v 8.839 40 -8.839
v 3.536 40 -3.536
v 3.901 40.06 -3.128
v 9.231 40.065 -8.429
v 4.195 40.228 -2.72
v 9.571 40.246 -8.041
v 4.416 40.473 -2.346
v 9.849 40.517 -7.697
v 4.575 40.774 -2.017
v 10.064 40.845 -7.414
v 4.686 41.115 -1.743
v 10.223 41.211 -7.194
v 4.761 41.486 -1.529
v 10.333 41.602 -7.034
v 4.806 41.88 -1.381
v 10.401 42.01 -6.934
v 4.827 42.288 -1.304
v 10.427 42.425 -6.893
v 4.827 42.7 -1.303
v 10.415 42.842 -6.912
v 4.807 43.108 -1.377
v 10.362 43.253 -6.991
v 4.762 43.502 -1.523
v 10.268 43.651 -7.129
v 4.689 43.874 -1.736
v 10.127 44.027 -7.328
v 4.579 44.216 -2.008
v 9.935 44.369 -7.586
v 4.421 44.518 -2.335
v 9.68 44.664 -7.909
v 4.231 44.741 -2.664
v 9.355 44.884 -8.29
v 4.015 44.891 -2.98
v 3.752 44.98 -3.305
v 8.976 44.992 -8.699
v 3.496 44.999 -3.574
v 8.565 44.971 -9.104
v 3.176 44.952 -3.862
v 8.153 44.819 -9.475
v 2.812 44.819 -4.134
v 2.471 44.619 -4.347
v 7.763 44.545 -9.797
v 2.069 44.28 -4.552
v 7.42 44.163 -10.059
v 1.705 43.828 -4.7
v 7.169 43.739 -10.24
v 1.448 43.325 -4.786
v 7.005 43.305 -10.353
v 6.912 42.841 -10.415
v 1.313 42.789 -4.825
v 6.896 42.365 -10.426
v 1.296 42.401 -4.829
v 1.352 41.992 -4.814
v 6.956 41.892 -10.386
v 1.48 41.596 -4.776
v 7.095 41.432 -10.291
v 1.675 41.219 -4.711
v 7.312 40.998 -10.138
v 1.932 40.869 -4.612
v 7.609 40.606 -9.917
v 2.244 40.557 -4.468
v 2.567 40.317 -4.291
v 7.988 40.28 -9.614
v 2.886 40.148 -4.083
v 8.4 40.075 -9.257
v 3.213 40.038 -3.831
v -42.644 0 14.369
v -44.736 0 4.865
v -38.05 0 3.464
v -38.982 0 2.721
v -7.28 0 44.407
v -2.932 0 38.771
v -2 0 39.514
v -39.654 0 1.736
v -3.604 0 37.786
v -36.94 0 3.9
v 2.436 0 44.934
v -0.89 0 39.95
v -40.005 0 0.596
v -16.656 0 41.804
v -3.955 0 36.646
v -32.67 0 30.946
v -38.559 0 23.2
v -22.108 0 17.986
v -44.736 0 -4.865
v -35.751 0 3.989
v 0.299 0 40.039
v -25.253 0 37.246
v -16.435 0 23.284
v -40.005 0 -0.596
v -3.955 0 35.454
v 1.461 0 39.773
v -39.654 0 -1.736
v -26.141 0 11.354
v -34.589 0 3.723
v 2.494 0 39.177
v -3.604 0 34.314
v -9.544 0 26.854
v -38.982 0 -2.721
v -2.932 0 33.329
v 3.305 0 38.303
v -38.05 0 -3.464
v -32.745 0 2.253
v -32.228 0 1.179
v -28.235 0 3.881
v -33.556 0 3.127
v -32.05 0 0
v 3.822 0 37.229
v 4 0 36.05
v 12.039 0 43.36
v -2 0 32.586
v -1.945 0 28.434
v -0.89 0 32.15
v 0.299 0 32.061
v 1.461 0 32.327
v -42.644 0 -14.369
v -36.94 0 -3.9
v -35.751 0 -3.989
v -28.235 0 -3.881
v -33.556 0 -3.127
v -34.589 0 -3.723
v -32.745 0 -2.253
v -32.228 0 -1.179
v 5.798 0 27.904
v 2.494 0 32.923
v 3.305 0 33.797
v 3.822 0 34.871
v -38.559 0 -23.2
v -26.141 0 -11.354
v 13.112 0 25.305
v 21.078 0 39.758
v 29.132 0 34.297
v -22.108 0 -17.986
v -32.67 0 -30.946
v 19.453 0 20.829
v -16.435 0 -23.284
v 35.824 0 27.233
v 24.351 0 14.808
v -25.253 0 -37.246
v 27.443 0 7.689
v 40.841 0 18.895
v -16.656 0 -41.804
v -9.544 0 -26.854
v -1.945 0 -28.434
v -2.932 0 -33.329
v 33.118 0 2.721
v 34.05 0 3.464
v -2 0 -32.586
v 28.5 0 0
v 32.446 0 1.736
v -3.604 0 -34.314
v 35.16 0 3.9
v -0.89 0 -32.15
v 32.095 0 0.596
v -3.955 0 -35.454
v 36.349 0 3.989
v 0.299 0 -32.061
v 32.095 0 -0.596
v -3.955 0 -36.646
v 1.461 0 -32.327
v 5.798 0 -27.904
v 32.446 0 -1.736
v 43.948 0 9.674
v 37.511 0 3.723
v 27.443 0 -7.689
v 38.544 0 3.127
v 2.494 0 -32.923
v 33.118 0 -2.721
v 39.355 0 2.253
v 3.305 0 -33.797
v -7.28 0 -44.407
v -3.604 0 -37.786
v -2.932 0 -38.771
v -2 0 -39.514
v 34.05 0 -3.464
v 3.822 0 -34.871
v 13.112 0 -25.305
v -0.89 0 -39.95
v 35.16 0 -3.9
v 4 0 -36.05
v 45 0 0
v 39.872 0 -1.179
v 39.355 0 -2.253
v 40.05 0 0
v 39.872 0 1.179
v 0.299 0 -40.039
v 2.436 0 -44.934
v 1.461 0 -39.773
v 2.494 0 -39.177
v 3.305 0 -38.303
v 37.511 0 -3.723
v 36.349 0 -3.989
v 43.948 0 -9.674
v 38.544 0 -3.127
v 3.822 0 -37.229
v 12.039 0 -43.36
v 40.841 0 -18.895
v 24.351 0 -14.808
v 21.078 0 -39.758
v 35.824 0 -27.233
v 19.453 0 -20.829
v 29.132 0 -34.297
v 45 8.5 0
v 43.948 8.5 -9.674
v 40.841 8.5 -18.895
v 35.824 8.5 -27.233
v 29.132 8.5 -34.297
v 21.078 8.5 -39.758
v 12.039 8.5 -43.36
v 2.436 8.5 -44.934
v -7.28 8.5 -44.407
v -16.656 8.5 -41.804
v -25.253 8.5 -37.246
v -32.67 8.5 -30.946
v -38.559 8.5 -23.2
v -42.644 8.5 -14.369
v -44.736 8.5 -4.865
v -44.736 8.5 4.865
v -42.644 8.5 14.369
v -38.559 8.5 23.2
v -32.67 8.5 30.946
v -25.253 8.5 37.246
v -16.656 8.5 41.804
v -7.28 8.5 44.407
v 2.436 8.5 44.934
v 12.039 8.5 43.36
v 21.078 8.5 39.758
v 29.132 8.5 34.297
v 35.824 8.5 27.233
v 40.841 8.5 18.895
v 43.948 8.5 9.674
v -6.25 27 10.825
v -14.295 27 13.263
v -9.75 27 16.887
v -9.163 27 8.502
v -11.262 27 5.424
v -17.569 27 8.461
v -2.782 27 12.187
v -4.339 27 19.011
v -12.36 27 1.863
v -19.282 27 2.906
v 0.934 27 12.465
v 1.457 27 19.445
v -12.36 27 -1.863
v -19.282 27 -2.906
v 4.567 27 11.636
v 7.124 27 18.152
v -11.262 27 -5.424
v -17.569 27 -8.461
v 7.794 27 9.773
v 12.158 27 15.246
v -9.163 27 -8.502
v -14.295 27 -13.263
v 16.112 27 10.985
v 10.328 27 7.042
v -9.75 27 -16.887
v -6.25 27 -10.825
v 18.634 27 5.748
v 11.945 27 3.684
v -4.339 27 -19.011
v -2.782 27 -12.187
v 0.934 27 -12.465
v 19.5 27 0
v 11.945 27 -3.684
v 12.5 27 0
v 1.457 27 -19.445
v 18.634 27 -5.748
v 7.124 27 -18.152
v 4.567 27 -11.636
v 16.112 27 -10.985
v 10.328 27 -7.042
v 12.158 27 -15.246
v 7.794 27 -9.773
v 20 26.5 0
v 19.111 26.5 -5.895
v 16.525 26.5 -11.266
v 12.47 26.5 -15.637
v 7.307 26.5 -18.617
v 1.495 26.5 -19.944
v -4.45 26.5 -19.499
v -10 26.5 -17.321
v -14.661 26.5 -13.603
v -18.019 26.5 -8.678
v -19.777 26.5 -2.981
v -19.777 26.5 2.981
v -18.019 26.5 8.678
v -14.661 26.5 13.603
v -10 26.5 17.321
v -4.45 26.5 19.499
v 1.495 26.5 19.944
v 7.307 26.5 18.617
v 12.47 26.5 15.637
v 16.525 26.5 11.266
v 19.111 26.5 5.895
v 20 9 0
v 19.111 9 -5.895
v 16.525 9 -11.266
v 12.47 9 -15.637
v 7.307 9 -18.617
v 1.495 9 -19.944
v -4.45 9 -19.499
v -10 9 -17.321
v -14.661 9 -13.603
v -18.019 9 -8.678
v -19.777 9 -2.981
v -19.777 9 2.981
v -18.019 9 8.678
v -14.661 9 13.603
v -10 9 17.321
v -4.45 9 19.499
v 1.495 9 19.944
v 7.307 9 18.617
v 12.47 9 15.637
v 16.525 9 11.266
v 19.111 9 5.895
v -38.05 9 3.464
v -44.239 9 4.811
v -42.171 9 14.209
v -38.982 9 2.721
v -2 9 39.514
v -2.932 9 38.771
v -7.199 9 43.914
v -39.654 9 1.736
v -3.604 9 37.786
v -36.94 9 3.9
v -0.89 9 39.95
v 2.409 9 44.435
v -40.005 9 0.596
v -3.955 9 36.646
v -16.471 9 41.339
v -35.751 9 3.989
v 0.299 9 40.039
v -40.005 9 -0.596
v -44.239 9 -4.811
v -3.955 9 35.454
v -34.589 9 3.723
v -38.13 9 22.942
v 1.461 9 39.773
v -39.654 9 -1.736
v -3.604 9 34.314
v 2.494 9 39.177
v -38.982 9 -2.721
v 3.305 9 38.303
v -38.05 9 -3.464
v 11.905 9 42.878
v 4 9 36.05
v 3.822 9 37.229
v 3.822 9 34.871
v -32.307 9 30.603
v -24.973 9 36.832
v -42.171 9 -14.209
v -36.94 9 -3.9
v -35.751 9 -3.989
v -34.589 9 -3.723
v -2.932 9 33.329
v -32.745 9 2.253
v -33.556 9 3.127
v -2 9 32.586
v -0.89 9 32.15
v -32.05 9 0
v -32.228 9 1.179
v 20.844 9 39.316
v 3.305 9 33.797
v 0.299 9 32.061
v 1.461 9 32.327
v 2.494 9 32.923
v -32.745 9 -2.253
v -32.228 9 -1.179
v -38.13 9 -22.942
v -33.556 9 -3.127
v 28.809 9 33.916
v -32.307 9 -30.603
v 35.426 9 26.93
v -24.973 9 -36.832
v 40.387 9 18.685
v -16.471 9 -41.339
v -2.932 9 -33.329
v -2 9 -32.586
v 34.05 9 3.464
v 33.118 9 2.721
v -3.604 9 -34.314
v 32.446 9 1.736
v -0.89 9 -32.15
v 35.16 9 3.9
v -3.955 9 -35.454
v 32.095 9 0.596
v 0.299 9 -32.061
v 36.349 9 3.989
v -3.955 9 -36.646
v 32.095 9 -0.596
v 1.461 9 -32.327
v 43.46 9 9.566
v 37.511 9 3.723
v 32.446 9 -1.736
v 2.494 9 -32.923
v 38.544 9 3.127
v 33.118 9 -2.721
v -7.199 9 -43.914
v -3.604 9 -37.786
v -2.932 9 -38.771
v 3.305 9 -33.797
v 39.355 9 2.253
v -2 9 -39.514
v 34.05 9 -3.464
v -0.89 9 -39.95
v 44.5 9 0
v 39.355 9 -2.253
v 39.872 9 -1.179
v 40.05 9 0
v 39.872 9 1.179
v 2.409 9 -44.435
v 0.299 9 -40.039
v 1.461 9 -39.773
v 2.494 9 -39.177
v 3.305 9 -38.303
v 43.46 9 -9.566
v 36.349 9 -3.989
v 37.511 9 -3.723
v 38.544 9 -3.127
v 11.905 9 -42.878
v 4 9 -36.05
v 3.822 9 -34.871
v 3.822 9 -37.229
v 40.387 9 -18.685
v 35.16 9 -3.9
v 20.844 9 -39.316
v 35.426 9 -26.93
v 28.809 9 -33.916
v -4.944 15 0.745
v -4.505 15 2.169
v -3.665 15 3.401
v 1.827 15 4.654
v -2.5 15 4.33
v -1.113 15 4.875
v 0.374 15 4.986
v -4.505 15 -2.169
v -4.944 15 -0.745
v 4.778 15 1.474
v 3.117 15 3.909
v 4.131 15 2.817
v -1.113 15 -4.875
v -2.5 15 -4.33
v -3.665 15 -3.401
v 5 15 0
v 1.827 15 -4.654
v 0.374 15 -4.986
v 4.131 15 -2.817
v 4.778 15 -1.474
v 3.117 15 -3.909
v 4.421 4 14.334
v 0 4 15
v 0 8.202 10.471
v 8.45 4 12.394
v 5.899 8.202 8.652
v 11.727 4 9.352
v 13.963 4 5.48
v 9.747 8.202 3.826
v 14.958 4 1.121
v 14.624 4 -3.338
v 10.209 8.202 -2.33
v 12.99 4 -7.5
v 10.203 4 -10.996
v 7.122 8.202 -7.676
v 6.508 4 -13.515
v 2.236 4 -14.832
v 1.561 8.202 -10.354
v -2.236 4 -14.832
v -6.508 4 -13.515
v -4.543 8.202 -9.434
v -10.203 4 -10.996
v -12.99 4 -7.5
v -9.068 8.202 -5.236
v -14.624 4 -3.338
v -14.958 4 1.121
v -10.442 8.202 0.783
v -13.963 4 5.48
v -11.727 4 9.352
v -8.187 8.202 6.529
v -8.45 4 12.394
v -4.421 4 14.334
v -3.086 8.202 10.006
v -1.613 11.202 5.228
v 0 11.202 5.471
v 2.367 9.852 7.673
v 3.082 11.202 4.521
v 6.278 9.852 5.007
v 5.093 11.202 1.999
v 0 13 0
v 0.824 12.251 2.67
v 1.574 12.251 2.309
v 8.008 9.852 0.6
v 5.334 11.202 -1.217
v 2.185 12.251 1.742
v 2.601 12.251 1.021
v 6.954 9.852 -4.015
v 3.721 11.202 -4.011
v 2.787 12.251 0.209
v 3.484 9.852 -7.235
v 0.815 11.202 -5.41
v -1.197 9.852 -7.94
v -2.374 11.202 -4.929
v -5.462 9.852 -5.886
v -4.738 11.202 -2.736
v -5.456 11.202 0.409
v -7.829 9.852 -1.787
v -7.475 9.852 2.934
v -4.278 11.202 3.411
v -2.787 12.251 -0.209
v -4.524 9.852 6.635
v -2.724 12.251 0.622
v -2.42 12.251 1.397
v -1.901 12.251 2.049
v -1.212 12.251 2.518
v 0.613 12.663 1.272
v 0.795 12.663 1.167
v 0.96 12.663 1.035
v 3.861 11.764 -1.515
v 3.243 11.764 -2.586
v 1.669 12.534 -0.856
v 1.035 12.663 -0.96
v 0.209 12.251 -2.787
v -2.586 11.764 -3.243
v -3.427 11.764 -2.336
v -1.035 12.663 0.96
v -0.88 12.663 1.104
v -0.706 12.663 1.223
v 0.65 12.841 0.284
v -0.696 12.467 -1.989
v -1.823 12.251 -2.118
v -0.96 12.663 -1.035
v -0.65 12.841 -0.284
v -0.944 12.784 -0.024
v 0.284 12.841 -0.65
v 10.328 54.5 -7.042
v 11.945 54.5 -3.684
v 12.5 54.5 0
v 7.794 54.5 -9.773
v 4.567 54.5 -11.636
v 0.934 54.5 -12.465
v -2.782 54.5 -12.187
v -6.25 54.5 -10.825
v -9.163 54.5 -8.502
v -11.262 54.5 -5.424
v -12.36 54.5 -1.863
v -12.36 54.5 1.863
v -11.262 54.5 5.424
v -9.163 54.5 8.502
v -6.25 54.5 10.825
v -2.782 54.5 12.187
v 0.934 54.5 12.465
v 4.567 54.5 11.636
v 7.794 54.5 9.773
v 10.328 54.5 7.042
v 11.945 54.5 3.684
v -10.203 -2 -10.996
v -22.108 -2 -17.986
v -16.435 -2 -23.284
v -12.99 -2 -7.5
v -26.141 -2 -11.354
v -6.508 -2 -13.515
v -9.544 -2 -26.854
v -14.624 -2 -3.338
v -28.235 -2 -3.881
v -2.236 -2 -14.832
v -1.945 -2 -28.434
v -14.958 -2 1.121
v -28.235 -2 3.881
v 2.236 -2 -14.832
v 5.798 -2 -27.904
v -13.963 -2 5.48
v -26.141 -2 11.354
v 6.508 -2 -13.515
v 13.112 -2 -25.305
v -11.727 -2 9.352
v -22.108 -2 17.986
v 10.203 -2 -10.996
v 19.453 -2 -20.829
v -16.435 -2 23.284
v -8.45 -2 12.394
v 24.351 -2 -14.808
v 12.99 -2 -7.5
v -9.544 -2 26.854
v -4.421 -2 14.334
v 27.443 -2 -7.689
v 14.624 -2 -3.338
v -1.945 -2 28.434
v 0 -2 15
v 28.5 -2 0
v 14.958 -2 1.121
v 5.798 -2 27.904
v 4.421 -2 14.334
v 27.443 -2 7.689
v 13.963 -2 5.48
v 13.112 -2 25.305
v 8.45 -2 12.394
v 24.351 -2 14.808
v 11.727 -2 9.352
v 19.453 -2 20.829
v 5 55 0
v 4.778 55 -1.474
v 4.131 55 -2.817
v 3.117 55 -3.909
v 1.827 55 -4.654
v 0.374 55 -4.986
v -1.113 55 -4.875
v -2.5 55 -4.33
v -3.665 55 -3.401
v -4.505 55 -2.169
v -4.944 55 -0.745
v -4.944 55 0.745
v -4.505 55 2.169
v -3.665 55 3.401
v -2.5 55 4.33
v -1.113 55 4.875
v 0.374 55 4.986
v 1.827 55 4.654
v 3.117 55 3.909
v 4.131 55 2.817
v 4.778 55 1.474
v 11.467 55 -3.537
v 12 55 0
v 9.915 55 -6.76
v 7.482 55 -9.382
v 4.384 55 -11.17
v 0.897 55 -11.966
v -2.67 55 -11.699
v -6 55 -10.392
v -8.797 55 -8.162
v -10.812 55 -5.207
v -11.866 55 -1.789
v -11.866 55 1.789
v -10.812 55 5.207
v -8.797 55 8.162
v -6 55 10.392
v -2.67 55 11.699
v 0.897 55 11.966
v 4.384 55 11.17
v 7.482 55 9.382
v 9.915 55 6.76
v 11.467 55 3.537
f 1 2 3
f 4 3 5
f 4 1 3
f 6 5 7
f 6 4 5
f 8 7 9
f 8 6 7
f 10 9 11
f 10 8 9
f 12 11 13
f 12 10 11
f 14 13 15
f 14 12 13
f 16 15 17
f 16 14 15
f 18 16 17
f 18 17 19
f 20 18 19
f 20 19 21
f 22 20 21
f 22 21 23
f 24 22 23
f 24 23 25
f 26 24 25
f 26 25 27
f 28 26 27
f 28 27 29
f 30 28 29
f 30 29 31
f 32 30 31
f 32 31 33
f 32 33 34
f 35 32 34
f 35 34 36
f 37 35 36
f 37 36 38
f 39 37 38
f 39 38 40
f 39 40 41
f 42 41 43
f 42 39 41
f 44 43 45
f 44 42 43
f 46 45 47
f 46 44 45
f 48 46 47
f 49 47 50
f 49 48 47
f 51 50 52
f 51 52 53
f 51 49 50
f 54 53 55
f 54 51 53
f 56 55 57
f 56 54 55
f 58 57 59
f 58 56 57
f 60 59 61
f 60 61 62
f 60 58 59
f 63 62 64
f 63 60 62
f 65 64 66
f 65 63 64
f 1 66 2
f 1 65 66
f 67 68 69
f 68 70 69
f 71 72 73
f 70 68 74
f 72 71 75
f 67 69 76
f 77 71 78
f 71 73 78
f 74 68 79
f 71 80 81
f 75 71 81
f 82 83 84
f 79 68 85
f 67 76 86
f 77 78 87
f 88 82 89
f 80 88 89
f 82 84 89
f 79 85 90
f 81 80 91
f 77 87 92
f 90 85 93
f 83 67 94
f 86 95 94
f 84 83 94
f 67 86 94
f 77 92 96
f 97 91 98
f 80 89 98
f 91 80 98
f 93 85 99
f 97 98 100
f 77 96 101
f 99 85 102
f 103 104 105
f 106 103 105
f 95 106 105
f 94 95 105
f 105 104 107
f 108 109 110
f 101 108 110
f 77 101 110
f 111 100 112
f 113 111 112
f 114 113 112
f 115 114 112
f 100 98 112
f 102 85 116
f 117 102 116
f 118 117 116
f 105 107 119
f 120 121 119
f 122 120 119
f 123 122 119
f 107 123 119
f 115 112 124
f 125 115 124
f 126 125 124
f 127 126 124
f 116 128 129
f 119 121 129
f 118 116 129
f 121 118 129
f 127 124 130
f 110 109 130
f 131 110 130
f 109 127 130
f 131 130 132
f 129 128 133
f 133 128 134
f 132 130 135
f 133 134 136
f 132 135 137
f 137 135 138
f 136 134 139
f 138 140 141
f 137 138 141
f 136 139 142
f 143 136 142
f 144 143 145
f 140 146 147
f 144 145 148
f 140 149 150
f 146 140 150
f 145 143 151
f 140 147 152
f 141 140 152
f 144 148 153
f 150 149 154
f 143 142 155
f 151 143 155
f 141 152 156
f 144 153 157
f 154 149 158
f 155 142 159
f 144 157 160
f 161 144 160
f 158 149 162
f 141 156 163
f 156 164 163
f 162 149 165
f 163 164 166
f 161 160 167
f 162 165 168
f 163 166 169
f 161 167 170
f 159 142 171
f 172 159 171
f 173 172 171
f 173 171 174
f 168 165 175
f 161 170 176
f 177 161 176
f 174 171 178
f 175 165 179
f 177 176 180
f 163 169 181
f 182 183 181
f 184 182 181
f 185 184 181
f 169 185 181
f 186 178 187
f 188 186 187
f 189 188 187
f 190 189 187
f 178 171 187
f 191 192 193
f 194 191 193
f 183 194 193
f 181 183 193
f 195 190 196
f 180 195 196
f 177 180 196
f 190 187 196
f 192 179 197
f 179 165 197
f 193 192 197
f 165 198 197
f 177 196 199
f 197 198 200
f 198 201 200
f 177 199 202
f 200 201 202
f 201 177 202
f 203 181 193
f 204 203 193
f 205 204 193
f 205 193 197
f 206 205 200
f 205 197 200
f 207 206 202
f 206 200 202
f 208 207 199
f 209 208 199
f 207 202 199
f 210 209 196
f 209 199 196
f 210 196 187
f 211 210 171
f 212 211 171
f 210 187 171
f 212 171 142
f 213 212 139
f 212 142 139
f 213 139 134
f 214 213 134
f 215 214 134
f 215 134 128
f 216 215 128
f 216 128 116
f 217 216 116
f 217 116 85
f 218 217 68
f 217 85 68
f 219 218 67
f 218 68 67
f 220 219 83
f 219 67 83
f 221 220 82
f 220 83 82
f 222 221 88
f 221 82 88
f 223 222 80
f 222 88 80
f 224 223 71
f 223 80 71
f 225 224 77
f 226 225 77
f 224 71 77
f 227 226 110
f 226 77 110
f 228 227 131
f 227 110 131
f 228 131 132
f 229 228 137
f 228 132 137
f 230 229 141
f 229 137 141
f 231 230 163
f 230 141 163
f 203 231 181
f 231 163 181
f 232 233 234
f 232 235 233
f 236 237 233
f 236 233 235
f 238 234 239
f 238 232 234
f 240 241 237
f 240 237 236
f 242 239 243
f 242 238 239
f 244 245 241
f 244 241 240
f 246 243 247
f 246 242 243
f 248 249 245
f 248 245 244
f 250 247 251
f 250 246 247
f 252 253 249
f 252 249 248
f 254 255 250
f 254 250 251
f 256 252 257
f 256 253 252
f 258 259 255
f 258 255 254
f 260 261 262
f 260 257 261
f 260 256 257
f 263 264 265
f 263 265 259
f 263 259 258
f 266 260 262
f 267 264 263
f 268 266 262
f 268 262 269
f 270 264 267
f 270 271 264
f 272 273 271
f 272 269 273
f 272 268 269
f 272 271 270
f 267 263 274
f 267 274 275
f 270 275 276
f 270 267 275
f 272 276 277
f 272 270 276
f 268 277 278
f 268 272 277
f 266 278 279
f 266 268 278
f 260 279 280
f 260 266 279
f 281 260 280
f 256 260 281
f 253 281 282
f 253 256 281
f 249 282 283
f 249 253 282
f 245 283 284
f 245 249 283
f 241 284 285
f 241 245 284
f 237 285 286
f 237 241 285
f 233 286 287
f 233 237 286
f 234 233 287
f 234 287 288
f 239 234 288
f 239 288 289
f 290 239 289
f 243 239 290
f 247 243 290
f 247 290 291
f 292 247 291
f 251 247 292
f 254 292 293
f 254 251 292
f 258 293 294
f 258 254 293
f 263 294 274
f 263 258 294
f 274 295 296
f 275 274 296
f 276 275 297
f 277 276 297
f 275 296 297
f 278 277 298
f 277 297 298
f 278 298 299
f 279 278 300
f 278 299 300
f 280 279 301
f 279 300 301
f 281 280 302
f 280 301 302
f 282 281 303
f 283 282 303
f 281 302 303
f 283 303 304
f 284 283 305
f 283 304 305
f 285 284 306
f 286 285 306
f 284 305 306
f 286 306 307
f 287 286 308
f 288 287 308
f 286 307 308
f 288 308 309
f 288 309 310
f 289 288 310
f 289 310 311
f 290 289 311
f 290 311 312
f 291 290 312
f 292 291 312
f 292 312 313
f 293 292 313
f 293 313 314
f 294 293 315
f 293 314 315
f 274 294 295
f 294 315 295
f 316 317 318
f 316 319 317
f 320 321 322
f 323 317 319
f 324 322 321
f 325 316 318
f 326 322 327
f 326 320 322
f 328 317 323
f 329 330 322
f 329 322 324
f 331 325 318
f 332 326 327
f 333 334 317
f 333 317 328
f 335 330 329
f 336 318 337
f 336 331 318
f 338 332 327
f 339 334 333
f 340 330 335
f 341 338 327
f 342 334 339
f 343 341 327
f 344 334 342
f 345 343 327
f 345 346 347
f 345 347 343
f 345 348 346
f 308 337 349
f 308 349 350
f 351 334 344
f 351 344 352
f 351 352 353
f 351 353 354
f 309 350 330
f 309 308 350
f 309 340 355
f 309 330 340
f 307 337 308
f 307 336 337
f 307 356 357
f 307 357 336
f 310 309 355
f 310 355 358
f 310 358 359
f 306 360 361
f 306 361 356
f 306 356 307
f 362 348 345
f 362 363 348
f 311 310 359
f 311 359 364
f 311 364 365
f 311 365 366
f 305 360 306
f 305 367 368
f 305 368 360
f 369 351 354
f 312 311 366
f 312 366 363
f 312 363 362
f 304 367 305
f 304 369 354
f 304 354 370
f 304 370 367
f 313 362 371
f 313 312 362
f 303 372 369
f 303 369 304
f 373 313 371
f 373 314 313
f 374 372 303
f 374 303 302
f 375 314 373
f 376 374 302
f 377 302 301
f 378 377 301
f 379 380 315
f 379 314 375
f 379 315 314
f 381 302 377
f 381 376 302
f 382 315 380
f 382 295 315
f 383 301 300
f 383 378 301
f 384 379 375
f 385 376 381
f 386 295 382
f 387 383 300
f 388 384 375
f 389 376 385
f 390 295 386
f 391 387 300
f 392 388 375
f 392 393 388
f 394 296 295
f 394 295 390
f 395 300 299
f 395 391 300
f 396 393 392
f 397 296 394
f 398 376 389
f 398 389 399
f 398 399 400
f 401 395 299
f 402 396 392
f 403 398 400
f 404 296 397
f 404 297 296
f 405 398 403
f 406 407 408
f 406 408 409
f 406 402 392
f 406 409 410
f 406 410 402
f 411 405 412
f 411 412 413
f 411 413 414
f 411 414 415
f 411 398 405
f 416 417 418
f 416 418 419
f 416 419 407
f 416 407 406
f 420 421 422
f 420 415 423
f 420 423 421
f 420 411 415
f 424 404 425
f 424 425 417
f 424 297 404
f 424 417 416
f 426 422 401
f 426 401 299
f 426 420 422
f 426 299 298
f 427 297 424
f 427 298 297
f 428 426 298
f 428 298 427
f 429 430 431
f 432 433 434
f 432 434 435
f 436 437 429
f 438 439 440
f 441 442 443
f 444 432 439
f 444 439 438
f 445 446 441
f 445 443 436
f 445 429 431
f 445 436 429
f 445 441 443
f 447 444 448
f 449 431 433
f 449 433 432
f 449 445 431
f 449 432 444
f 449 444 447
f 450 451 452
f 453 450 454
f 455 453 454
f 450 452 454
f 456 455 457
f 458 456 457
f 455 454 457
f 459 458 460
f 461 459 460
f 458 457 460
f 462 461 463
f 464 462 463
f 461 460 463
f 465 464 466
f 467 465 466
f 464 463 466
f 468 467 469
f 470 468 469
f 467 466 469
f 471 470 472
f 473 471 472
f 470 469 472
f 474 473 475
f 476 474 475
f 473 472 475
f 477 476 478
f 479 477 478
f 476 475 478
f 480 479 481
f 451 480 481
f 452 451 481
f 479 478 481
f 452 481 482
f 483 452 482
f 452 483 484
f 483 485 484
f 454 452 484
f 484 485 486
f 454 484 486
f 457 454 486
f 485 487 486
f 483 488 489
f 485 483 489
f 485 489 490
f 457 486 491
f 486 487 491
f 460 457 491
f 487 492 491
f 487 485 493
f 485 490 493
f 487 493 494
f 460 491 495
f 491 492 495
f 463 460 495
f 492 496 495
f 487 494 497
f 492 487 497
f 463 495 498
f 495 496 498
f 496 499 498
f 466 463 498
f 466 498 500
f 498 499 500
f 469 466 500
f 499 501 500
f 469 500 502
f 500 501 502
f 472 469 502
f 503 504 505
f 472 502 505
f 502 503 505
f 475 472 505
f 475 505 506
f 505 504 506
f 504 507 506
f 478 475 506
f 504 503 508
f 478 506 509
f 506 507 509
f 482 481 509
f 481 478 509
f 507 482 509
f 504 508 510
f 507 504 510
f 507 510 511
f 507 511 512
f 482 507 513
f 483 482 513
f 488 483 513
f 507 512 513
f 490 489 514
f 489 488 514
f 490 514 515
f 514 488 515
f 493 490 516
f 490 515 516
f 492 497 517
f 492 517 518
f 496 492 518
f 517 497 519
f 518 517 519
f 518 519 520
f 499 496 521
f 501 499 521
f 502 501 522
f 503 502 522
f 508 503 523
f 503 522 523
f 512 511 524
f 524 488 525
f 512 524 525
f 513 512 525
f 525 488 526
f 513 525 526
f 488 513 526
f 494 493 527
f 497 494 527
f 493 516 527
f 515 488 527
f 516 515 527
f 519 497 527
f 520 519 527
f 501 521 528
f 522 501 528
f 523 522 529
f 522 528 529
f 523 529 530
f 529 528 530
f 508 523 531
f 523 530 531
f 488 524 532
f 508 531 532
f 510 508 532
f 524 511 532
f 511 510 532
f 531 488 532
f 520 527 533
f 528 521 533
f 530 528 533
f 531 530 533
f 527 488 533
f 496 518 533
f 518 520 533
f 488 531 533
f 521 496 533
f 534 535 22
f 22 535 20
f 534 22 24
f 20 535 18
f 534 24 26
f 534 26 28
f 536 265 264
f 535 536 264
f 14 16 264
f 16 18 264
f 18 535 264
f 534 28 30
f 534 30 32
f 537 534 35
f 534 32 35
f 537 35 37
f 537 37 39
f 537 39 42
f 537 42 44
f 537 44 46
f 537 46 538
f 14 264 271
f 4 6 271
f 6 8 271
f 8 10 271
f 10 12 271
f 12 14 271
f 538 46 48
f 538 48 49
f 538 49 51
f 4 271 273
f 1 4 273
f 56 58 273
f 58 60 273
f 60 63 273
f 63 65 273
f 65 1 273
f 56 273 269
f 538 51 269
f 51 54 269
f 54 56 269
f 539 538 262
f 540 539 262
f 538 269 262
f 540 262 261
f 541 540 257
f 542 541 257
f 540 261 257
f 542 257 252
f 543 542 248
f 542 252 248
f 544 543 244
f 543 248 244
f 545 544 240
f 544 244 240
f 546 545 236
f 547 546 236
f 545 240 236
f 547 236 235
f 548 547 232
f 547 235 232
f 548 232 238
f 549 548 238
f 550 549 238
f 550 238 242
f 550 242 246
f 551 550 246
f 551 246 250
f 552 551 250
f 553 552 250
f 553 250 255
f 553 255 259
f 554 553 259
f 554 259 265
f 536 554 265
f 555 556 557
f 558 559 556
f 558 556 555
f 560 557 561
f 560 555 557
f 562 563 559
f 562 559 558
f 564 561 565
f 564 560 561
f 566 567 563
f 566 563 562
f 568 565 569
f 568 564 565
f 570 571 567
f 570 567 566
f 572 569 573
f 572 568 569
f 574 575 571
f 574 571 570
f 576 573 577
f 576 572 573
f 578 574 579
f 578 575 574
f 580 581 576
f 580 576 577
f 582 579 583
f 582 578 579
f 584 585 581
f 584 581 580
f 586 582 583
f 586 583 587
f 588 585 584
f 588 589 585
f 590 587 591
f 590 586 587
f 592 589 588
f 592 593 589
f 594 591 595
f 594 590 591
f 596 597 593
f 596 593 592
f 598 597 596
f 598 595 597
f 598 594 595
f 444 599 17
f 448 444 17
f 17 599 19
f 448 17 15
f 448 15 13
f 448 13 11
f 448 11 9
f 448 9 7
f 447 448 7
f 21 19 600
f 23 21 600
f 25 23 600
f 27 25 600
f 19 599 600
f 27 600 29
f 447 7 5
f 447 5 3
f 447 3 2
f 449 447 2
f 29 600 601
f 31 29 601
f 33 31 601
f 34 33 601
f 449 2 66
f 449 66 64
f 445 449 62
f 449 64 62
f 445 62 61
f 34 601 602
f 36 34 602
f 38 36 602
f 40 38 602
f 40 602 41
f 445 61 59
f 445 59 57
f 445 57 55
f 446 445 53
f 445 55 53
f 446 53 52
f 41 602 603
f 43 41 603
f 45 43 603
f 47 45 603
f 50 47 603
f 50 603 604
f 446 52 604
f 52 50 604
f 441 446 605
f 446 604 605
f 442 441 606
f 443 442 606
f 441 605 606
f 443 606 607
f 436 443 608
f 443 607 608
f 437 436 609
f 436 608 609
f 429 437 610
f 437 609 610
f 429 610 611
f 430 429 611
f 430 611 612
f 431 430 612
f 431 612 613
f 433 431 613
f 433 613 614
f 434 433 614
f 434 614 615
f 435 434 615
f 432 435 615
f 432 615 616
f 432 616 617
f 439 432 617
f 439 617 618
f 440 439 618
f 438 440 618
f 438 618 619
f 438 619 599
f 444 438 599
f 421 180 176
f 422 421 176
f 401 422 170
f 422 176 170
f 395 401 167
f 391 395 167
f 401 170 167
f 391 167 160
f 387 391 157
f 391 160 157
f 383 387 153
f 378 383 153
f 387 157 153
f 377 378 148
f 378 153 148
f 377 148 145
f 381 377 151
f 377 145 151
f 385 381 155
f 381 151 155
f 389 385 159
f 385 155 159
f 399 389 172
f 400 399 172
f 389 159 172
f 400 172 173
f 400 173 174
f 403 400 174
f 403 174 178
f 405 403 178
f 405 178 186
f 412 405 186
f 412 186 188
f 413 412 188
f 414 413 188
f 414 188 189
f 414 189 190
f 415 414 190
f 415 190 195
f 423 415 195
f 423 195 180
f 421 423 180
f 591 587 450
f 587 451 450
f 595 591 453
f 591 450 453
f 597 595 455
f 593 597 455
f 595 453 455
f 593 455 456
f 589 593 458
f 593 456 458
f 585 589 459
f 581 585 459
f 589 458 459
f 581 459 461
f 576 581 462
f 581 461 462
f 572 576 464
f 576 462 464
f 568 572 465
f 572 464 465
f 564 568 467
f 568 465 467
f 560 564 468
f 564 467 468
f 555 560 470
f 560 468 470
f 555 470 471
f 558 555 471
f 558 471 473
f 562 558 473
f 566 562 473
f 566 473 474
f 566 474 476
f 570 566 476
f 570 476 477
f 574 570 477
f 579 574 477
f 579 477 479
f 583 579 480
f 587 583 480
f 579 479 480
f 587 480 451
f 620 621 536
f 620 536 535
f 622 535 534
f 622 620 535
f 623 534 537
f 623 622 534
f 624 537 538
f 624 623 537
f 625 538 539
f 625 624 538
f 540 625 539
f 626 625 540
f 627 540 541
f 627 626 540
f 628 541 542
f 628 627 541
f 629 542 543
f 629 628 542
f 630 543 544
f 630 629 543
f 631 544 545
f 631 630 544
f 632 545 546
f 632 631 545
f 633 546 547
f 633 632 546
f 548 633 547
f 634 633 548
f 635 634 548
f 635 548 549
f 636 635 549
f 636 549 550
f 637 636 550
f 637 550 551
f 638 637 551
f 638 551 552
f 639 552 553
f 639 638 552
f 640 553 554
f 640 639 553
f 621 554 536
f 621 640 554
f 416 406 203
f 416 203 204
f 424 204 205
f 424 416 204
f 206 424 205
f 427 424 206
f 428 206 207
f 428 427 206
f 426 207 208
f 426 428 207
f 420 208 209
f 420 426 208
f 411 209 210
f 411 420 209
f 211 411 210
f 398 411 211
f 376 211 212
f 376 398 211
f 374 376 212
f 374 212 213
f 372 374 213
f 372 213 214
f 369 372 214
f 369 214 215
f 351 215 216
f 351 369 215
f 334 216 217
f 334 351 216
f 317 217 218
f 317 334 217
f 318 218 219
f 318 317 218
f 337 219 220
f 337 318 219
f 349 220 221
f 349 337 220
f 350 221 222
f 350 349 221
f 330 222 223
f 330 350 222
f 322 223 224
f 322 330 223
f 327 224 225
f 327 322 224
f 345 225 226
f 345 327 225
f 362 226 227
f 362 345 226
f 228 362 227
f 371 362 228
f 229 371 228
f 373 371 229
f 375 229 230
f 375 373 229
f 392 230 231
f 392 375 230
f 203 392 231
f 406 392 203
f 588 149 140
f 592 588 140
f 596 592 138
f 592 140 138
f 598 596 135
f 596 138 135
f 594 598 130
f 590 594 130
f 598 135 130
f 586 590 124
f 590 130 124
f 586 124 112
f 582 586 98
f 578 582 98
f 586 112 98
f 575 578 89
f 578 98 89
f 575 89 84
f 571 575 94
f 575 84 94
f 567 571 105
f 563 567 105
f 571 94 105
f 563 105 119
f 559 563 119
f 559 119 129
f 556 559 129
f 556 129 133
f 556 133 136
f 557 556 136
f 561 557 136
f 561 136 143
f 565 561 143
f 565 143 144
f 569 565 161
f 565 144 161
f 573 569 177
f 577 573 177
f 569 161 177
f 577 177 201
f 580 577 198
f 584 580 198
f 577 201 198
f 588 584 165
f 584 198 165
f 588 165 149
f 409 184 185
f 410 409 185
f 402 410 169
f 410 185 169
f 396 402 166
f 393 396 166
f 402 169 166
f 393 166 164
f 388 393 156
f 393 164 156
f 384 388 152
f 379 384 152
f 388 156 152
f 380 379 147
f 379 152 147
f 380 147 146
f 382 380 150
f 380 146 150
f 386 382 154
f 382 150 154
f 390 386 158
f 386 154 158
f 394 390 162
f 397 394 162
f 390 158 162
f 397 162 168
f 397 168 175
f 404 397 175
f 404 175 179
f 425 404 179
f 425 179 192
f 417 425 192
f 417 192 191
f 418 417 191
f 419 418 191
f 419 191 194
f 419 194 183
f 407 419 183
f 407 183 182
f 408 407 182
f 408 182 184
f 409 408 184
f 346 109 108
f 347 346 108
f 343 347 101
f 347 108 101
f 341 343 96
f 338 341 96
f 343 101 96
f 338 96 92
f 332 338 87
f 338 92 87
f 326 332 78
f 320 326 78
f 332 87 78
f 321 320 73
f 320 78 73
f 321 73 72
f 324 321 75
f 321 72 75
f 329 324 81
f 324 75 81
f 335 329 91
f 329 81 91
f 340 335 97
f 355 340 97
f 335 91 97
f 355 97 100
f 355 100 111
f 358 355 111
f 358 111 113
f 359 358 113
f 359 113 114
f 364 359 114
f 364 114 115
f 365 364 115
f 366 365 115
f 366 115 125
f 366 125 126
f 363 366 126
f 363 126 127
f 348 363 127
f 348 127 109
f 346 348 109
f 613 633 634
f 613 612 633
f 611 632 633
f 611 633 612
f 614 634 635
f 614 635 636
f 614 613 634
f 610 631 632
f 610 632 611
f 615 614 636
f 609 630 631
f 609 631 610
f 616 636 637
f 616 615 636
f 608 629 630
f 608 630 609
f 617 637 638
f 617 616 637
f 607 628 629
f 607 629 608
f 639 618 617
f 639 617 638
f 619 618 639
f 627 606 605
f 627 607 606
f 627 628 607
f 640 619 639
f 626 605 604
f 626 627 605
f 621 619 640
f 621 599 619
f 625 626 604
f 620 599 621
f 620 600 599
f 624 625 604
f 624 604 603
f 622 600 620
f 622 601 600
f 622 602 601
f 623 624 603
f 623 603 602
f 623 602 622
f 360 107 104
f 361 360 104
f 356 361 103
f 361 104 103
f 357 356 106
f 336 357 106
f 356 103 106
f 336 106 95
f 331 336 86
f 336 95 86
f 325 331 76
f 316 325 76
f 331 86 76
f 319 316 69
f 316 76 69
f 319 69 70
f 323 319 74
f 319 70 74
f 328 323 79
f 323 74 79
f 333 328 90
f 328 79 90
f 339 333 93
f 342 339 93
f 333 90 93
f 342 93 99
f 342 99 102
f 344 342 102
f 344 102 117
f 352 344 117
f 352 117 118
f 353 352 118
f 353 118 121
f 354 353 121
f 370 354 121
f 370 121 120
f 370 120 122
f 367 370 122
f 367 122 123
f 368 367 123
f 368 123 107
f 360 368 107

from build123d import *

# Parameters (mm, degrees)
SKETCH1_R           = 45
BOSS_EXTRUDE1_DEPTH = 9
SKETCH3_R           = 20
BOSS_EXTRUDE2_DEPTH = 18
SKETCH4_R           = 12.5
BOSS_EXTRUDE3_DEPTH = 28
SKETCH5_R           = 28.5
BOSS_EXTRUDE4_DEPTH = 2
SKETCH6_R           = 5
CUT_EXTRUDE1_DEPTH  = 40
CUT_EXTRUDE2_REACH  = 57
SKETCH8_R           = 4
CUT_EXTRUDE3_REACH  = 78.14
SKETCH9_R           = 2.5
CHAMFER1_SIZE       = 0.5


with BuildPart() as part:
    # Sketch1 → Boss-Extrude1 (new body)
    with BuildSketch(Plane(origin=(0, 0, 0), x_dir=(1, 0, 0), z_dir=(0, 1, 0))):
        Circle(SKETCH1_R)
    extrude(amount=BOSS_EXTRUDE1_DEPTH)

    # Sketch3 → Boss-Extrude2 (add)
    with BuildSketch(Plane(origin=(0, 9, 0), x_dir=(1, 0, 0), z_dir=(0, 1, 0))):
        Circle(SKETCH3_R)
    extrude(amount=BOSS_EXTRUDE2_DEPTH)

    # Sketch4 → Boss-Extrude3 (add)
    with BuildSketch(Plane(origin=(0, 27, 0), x_dir=(1, 0, 0), z_dir=(0, 1, 0))):
        Circle(SKETCH4_R)
    extrude(amount=BOSS_EXTRUDE3_DEPTH)

    # Sketch5 → Boss-Extrude4 (add)
    with BuildSketch(Plane.XZ):
        Circle(SKETCH5_R)
    extrude(amount=BOSS_EXTRUDE4_DEPTH)

    # Sketch6 → Cut-Extrude1 (cut)
    with BuildSketch(Plane(origin=(0, 55, 0), x_dir=(1, 0, 0), z_dir=(0, 1, 0))):
        Circle(SKETCH6_R)
    extrude(amount=-CUT_EXTRUDE1_DEPTH, mode=Mode.SUBTRACT)

    # Sketch7 → Cut-Revolve1 (revolve, cut)
    with BuildSketch(Plane(origin=(0, 0, 0), x_dir=(0, 0, -1), z_dir=(1, 0, 0))):
        with BuildLine():
            add(Edge.make_bspline(
                [(-15, 4), (-8.560208032, 11.204773426), (0, 13)],
                knots=[0, 0, 0, 1, 1, 1], degree=2))
            Line((0, 13), (0, -2))
            Line((0, -2), (-15, -2))
            Line((-15, -2), (-15, 4))
        make_face()
    revolve(axis=Axis((0, -2, 0), (0, 1, 0)), mode=Mode.SUBTRACT)

    # Sketch8 → Cut-Extrude2 (cut, up to next)
    with BuildSketch(Plane.XZ, mode=Mode.PRIVATE) as cut_extrude2_sk1:
        with Locations((0, 36.05)):
            Circle(SKETCH8_R)
    cut_extrude2_tool1 = extrude(cut_extrude2_sk1.sketch, amount=-CUT_EXTRUDE2_REACH, mode=Mode.PRIVATE) & part.part
    add(cut_extrude2_tool1.solids().sort_by_distance((0, 0, 36.05))[0], mode=Mode.SUBTRACT)
    # Sketch8 → Cut-Extrude2 (cut, up to next)
    with BuildSketch(Plane.XZ, mode=Mode.PRIVATE) as cut_extrude2_sk2:
        with Locations((-36.05, 0)):
            Circle(SKETCH8_R)
    cut_extrude2_tool2 = extrude(cut_extrude2_sk2.sketch, amount=-CUT_EXTRUDE2_REACH, mode=Mode.PRIVATE) & part.part
    add(cut_extrude2_tool2.solids().sort_by_distance((-36.05, 0, 0))[0], mode=Mode.SUBTRACT)
    # Sketch8 → Cut-Extrude2 (cut, up to next)
    with BuildSketch(Plane.XZ, mode=Mode.PRIVATE) as cut_extrude2_sk3:
        with Locations((0, -36.05)):
            Circle(SKETCH8_R)
    cut_extrude2_tool3 = extrude(cut_extrude2_sk3.sketch, amount=-CUT_EXTRUDE2_REACH, mode=Mode.PRIVATE) & part.part
    add(cut_extrude2_tool3.solids().sort_by_distance((0, 0, -36.05))[0], mode=Mode.SUBTRACT)
    # Sketch8 → Cut-Extrude2 (cut, up to next)
    with BuildSketch(Plane.XZ, mode=Mode.PRIVATE) as cut_extrude2_sk4:
        with Locations((36.05, 0)):
            Circle(SKETCH8_R)
    cut_extrude2_tool4 = extrude(cut_extrude2_sk4.sketch, amount=-CUT_EXTRUDE2_REACH, mode=Mode.PRIVATE) & part.part
    add(cut_extrude2_tool4.solids().sort_by_distance((36.05, 0, 0))[0], mode=Mode.SUBTRACT)

    # Sketch9 → Cut-Extrude3 (cut, up to next)
    with BuildSketch(Plane(origin=(8.838834765, 0, -8.838834765), x_dir=(0, -1, 0), z_dir=(-0.707106781, 0, 0.707106781)), mode=Mode.PRIVATE) as cut_extrude3_sk1:
        with Locations((-42.5, 0)):
            Circle(SKETCH9_R)
    cut_extrude3_tool1 = extrude(cut_extrude3_sk1.sketch, amount=CUT_EXTRUDE3_REACH, mode=Mode.PRIVATE) & part.part
    add(cut_extrude3_tool1.solids().sort_by_distance((8.838835, 42.5, -8.838835))[0], mode=Mode.SUBTRACT)

    # Chamfer1
    chamfer1_edges = [part.edges().sort_by_distance(p)[0] for p in [
        (-12.5, 55, 0),
        (-45, 9, 0),
        (-20, 27, 0),
    ]]
    chamfer(chamfer1_edges, length=CHAMFER1_SIZE)


solid = part.part
